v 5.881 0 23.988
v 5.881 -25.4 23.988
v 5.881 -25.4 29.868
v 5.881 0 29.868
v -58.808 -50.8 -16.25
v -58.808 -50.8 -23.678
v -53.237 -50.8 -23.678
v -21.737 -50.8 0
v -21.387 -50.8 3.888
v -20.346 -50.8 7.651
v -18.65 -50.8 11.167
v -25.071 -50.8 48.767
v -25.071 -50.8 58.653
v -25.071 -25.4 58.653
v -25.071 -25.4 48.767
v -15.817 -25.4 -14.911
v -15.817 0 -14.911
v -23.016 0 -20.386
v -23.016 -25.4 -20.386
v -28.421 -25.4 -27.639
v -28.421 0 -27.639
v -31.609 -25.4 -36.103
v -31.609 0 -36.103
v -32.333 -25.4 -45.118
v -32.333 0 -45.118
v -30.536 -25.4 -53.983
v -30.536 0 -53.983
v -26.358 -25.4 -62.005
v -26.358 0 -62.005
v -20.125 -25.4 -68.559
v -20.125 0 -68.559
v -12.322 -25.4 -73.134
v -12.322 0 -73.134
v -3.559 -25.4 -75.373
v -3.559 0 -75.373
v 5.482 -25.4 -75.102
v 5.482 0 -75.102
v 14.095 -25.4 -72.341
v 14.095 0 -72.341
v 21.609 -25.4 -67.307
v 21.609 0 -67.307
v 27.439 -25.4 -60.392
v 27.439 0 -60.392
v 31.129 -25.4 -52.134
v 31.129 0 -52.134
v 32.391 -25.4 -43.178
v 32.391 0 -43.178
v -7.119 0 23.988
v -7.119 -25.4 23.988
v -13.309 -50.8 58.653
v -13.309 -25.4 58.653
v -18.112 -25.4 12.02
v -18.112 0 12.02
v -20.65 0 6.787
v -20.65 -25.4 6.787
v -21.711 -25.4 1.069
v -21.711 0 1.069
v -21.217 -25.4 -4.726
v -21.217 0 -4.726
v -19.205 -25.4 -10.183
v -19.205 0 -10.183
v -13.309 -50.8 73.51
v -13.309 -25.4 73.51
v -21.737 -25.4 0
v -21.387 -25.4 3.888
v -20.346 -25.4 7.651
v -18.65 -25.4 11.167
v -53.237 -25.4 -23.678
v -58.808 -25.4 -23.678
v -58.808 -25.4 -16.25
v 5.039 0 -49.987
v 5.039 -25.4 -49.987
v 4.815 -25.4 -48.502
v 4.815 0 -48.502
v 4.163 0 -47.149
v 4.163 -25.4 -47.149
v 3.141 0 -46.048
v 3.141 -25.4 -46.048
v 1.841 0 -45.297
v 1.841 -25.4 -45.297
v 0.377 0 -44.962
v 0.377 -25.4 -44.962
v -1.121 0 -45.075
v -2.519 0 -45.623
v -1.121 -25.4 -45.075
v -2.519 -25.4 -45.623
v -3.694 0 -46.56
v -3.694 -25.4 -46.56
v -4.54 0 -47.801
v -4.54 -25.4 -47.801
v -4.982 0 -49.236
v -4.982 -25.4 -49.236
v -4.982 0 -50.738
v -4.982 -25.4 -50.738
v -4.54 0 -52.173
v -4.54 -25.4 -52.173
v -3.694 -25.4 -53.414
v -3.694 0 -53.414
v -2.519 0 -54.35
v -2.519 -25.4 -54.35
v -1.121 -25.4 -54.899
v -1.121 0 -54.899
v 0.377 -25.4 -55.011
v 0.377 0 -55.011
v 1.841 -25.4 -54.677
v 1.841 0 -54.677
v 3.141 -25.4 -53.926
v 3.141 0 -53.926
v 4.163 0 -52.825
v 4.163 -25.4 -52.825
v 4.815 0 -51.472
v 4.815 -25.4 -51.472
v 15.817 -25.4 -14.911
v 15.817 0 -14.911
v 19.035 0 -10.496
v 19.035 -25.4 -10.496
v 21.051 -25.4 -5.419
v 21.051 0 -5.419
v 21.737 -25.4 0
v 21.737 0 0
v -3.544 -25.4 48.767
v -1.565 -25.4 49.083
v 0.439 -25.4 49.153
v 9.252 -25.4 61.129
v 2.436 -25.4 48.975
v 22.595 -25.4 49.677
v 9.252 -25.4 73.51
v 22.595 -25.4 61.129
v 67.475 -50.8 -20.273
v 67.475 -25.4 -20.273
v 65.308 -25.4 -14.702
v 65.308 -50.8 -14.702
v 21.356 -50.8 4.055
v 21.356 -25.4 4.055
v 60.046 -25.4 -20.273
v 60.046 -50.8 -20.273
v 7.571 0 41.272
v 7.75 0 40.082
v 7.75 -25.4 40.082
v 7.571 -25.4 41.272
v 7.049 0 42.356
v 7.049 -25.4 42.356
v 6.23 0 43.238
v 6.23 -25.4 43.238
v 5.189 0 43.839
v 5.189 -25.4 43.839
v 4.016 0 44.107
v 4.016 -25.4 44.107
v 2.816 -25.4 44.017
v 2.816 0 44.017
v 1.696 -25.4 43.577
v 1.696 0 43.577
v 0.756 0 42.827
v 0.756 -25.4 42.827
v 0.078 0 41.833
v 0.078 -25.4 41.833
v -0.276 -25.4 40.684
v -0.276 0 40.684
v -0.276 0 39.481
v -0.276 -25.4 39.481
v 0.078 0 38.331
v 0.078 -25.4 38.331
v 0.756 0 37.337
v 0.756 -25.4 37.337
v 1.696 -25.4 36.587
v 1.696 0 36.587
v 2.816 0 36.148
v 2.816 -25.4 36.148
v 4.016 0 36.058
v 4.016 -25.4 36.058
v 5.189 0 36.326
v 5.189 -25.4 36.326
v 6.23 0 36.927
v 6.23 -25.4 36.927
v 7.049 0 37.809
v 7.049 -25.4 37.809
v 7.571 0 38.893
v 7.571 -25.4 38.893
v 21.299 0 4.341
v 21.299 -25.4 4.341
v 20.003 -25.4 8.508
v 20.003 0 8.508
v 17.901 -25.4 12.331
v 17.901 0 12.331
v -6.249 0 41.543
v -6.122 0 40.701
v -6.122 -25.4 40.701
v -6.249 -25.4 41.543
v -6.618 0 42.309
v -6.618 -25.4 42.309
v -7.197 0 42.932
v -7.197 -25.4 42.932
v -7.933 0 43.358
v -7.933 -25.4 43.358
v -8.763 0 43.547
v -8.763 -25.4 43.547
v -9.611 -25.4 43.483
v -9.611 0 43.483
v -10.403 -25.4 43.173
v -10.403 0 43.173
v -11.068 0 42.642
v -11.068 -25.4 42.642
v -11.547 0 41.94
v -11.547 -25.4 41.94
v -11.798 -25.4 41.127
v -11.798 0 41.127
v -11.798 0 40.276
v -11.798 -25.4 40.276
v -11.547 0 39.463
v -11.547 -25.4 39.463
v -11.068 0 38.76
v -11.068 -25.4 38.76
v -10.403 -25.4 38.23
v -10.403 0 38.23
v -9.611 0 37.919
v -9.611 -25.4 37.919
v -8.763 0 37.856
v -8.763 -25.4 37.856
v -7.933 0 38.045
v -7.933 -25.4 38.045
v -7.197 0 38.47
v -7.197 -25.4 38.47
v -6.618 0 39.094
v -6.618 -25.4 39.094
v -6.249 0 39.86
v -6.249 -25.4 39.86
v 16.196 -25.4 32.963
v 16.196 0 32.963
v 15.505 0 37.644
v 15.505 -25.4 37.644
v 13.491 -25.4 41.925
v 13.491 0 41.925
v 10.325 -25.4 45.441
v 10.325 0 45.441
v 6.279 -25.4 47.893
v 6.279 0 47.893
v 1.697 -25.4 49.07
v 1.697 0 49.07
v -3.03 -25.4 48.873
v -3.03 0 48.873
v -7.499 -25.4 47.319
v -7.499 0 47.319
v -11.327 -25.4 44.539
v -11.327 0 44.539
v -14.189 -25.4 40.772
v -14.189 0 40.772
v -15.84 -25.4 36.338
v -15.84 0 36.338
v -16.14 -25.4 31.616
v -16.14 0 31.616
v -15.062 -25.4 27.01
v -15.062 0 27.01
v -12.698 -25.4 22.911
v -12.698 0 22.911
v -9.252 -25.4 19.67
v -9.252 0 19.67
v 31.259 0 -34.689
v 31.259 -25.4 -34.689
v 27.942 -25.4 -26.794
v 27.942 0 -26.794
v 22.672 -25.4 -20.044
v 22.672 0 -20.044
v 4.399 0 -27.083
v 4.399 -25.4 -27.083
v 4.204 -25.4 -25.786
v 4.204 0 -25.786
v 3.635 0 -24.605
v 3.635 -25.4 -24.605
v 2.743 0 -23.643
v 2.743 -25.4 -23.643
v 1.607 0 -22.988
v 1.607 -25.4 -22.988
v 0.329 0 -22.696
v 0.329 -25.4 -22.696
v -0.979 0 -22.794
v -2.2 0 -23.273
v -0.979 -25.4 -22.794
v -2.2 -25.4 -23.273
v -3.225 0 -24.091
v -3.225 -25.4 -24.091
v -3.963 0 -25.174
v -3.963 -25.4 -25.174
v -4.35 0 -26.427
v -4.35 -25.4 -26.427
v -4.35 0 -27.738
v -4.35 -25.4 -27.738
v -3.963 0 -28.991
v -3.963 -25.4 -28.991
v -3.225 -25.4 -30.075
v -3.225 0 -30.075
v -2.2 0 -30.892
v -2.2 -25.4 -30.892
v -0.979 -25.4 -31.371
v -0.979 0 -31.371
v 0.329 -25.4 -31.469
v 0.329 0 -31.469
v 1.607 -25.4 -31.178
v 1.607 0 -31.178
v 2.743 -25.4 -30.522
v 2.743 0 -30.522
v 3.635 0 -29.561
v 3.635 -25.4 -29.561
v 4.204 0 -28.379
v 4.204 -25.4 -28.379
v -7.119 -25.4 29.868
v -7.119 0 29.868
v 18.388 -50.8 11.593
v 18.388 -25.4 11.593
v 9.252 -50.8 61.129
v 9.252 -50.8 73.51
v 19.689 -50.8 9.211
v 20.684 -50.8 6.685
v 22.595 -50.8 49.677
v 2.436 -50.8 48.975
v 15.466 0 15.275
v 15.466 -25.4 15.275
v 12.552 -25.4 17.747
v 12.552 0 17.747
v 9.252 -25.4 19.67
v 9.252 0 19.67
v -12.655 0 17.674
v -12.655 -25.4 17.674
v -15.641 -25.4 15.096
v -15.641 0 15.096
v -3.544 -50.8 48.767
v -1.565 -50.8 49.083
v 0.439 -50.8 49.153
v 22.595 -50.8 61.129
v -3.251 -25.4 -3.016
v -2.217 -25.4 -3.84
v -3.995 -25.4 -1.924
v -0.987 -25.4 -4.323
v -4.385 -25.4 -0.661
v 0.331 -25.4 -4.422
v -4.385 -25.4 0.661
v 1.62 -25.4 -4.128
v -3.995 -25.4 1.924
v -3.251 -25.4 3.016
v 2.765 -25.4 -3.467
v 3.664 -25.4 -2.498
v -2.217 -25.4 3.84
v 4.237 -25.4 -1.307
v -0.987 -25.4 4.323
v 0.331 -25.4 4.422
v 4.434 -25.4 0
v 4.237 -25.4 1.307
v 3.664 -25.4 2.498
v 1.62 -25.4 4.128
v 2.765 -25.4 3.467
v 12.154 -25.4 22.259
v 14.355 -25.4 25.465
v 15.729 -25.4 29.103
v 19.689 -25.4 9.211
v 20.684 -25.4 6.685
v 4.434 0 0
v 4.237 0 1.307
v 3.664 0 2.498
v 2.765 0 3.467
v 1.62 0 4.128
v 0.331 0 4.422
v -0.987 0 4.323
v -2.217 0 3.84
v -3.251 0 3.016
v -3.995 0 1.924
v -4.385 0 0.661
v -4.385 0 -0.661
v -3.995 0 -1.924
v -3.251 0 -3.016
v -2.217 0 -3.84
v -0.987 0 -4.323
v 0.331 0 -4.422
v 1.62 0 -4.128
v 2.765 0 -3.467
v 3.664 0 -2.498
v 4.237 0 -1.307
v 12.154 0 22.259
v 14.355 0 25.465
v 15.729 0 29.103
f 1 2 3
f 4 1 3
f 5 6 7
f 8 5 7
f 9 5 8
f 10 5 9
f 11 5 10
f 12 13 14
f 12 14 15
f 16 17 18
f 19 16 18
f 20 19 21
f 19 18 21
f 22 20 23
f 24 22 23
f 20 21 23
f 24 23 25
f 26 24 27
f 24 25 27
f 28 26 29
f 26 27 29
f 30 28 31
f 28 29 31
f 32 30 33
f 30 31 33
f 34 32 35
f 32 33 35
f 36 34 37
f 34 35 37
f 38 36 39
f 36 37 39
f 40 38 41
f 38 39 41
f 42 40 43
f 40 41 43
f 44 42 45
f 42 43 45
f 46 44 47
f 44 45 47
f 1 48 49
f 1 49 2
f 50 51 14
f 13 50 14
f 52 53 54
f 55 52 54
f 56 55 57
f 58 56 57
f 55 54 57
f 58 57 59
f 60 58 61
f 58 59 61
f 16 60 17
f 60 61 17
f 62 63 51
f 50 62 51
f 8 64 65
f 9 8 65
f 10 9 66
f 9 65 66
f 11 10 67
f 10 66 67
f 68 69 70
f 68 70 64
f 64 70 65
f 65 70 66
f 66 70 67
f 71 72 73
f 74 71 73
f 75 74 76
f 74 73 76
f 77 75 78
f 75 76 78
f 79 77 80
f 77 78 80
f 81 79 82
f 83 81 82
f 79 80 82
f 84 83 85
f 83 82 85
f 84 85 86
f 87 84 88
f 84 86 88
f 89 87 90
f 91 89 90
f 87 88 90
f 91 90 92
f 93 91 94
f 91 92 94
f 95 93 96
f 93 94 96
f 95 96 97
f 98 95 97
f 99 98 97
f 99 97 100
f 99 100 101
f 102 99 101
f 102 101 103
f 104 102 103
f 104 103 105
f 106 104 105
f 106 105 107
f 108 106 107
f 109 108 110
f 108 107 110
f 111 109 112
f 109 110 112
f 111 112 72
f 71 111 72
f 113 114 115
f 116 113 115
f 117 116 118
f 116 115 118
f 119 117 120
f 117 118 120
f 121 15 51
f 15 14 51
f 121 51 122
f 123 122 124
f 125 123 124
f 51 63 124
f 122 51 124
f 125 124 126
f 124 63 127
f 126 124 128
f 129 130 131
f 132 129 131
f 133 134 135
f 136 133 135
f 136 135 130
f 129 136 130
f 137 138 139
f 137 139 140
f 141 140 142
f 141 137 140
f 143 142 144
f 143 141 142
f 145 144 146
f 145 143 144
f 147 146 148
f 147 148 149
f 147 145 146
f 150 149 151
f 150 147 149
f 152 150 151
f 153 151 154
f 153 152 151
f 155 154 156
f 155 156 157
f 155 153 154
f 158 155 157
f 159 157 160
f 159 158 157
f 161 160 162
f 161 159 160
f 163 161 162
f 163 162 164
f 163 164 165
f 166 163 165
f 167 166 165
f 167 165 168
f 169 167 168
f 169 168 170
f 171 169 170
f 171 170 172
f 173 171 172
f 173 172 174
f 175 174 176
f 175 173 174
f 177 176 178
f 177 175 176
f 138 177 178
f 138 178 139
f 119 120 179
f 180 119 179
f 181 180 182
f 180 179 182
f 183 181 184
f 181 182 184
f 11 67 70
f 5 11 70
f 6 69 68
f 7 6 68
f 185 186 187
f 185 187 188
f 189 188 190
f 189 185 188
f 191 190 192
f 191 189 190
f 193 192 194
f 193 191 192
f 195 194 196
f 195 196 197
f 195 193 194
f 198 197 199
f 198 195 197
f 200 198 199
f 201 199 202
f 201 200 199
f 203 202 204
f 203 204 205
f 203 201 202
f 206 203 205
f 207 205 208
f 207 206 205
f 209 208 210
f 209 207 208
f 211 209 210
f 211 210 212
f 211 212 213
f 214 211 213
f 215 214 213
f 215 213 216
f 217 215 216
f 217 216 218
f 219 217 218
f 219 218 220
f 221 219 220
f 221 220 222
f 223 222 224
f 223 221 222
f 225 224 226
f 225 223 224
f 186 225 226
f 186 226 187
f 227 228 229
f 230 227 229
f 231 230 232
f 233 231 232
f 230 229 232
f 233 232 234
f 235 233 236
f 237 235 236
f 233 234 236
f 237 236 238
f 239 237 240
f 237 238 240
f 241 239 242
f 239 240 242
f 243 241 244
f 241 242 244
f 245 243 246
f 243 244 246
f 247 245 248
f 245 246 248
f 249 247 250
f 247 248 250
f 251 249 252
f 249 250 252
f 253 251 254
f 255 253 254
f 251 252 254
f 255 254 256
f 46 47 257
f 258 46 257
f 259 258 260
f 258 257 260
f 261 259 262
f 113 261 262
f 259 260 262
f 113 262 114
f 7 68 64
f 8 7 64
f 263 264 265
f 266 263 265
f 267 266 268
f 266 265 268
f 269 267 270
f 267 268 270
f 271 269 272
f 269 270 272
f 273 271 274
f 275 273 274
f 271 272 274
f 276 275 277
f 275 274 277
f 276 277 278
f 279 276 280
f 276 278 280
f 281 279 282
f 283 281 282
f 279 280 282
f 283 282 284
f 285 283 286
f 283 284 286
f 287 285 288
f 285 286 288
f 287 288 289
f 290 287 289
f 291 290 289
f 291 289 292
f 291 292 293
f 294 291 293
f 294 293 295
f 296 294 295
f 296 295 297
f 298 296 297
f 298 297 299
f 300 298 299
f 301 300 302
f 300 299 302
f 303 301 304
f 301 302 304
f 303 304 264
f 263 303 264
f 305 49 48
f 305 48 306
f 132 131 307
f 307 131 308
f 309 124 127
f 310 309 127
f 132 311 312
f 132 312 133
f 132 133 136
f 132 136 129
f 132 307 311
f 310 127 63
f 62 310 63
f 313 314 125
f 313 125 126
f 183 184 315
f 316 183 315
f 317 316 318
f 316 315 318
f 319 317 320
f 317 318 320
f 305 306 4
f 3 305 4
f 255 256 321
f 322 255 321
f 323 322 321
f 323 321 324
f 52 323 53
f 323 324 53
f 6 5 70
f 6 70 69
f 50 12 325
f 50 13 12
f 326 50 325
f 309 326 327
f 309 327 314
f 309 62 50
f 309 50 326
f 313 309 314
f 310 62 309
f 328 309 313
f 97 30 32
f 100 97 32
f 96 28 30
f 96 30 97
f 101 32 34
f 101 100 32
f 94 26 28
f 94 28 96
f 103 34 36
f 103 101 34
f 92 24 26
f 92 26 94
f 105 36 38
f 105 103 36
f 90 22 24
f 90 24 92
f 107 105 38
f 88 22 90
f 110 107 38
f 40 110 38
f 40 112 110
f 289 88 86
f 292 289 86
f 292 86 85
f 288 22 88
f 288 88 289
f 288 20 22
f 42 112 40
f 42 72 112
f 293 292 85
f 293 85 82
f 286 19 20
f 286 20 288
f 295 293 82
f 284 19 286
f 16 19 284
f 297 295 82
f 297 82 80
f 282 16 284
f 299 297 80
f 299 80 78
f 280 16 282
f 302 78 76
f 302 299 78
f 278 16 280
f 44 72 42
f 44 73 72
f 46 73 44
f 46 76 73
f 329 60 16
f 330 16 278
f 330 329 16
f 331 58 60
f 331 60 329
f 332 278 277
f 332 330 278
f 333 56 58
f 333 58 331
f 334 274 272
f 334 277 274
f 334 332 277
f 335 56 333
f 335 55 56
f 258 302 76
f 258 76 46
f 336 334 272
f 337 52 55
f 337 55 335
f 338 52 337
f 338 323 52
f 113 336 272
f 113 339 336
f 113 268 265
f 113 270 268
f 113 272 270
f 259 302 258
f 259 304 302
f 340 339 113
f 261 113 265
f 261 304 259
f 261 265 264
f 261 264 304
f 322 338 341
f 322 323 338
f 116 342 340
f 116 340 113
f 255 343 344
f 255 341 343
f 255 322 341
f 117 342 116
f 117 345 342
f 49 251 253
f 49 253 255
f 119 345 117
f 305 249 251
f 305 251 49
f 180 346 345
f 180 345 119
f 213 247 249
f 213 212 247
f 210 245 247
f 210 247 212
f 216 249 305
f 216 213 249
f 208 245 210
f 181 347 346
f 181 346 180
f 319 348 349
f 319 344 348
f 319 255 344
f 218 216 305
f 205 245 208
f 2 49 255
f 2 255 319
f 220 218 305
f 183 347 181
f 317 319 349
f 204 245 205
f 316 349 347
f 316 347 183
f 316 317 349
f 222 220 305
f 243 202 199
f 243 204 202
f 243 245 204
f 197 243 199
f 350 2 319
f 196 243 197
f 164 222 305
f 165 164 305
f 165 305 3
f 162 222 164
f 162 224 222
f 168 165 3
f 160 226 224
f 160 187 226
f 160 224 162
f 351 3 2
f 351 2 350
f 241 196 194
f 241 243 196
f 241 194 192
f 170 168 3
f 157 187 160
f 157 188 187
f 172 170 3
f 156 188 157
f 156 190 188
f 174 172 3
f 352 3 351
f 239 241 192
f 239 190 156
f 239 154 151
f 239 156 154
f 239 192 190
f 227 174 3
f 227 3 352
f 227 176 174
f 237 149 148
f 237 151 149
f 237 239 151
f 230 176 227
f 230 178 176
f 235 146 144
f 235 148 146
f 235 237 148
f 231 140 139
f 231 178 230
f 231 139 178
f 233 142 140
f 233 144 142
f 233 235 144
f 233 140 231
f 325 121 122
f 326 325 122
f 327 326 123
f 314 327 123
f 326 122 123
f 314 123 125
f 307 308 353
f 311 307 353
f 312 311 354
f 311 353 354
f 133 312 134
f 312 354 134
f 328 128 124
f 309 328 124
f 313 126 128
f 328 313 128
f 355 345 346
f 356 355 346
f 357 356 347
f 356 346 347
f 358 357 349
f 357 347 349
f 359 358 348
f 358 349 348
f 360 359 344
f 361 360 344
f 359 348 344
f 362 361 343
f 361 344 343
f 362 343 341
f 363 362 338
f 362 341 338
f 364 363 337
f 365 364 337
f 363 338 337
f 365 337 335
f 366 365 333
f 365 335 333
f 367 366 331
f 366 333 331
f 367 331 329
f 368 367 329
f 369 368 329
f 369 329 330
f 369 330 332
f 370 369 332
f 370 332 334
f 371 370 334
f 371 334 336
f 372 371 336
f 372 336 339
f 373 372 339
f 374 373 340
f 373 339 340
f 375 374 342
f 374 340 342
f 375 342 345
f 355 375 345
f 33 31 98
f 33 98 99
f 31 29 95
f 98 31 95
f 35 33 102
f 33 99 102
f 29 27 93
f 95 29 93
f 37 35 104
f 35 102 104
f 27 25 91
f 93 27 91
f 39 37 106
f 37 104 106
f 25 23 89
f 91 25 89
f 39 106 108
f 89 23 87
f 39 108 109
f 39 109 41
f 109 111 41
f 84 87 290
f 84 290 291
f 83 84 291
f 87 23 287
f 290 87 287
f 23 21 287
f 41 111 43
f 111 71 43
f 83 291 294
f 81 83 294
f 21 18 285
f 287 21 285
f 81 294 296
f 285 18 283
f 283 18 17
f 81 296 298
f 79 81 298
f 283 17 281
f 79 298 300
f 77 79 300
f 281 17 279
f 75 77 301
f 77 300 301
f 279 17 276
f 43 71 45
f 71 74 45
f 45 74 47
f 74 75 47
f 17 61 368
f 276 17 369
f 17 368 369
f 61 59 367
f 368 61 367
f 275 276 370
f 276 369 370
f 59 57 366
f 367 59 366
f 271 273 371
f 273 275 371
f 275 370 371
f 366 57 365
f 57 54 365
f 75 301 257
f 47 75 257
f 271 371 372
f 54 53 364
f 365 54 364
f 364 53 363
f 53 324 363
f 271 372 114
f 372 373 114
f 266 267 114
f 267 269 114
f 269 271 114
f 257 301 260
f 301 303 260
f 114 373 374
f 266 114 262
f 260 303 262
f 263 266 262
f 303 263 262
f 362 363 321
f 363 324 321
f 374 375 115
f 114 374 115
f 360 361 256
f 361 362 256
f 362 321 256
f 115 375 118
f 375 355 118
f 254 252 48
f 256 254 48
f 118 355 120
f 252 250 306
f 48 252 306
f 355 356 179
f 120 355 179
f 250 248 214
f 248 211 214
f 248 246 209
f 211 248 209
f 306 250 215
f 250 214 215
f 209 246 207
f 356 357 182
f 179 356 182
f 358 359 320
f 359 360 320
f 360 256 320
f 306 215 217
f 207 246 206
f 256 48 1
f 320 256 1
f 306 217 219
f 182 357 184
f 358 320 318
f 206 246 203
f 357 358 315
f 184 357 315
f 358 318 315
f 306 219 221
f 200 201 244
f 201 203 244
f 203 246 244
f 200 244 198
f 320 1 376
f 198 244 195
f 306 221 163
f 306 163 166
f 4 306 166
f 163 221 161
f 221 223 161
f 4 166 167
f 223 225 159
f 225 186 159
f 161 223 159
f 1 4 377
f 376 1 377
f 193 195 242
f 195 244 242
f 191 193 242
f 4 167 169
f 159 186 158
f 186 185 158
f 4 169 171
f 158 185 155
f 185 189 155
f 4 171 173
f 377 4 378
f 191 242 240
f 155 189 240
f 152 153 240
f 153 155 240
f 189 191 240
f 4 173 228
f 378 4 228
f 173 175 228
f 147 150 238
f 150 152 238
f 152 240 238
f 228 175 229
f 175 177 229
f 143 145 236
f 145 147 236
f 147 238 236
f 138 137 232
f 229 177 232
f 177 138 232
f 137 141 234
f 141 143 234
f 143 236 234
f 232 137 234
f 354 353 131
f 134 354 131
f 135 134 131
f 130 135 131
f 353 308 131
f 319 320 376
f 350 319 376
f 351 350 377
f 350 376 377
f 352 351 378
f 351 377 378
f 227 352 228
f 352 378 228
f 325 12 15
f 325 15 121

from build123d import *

# Parameters (mm, degrees)
F0_R      = 2.8536008332
F0_R_2    = 4.0356012678
F1_DEPTH  = 25.4
F2_W      = 12.9996906035
F2_H      = 5.8808140457
F3_DEPTH  = 25.4
F4_R      = 4.4343033165
F4_R_2    = 4.3990558924
F4_R_3    = 5.038563347
F5_DEPTH  = 25.4
F7_DEPTH  = 25.4
F9_DEPTH  = 25.4
F11_DEPTH = 25.4


with BuildPart() as f1:
    # F0 (on Front) → F1 (new body)
    with BuildSketch(Plane.XZ):
        with BuildLine():
            ThreePointArc((15.8172677796, -14.9105895849), (20.2031786749, -8.021422144), (21.7373329041, 0))
            ThreePointArc((21.7373329041, 0), (20.7561218785, 6.4571701502), (17.9010714334, 12.3313942164))
            ThreePointArc((17.9010714334, 12.3313942164), (14.0634805526, 16.5749858682), (9.2515846168, 19.6702776763))
            ThreePointArc((9.2515846168, 19.6702776763), (0, 16.767772755), (-9.2515846168, 19.6702776763))
            ThreePointArc((-9.2515846168, 19.6702776763), (-14.2062358877, 16.4527962269), (-18.1115831207, 12.0200748186))
            ThreePointArc((-18.1115831207, 12.0200748186), (-21.6588758286, -1.845193655), (-15.8172677796, -14.9105895849))
            ThreePointArc((-15.8172677796, -14.9105895849), (0, -10.7860838011), (15.8172677796, -14.9105895849))
        make_face()
        with BuildLine():
            ThreePointArc((32.3914575442, -43.1775413454), (27.9423592382, -26.7936748284), (15.8172677796, -14.9105895849))
            ThreePointArc((15.8172677796, -14.9105895849), (0, -21.7373329041), (-15.8172677796, -14.9105895849))
            ThreePointArc((-15.8172677796, -14.9105895849), (-16.3838665169, -71.1199005835), (32.3914575442, -43.1775413454))
        make_face()
        with BuildLine():
            ThreePointArc((-15.8172677796, -14.9105895849), (0, -21.7373329041), (15.8172677796, -14.9105895849))
            ThreePointArc((15.8172677796, -14.9105895849), (0, -10.7860838011), (-15.8172677796, -14.9105895849))
        make_face()
        with BuildLine():
            ThreePointArc((-9.2515846168, 19.6702776763), (0, 16.767772755), (9.2515846168, 19.6702776763))
            ThreePointArc((9.2515846168, 19.6702776763), (0, 21.7373329041), (-9.2515846168, 19.6702776763))
        make_face()
        with BuildLine():
            ThreePointArc((-9.2515846168, 19.6702776763), (0, 21.7373329041), (9.2515846168, 19.6702776763))
            ThreePointArc((9.2515846168, 19.6702776763), (14.3550983655, 25.4646519589), (16.1957266719, 32.9634994268))
            ThreePointArc((16.1957266719, 32.9634994268), (-7.498847468, 47.3185977923), (-9.2515846168, 19.6702776763))
        make_face()
        with Locations((-8.9759770781, 40.7014116645)):
            Circle(F0_R, mode=Mode.SUBTRACT)
        with Locations((3.7141984794, 40.0823801756)):
            Circle(F0_R_2, mode=Mode.SUBTRACT)
    extrude(amount=F1_DEPTH)

    # F2 (on face) → F3 (cut)
    with BuildSketch(Plane.XZ.offset(25.4)):
        with Locations((-0.6190321874, 26.9279312342)):
            Rectangle(F2_W, F2_H)
    extrude(amount=-F3_DEPTH, mode=Mode.SUBTRACT)

    # F4 (on face) → F5 (cut)
    with BuildSketch(Plane.XZ.offset(25.4)):
        Circle(F4_R)
        with Locations((0, -27.0826891065)):
            Circle(F4_R_2)
        with Locations((0, -49.9869063497)):
            Circle(F4_R_3)
    extrude(amount=-F5_DEPTH, mode=Mode.SUBTRACT)


with BuildPart() as f7:
    # F6 (on face) → F7 (new body)
    with BuildSketch(Plane.XZ.offset(25.4)):
        with BuildLine():
            Line((-25.0708362817, 48.766700526), (-3.5440651025, 48.766700526))
            ThreePointArc((-3.5440651025, 48.766700526), (-0.5639242648, 49.1494053902), (2.4356253039, 48.975035637))
            Line((2.4356253039, 48.975035637), (22.5946996361, 49.6773868799))
            Line((22.5946996361, 49.6773868799), (22.5946996361, 61.1294955015))
            Line((22.5946996361, 61.1294955015), (9.2515846168, 61.1294955015))
            Line((9.2515846168, 61.1294955015), (9.2515846168, 73.5101550817))
            Line((9.2515846168, 73.5101550817), (-13.3092068136, 73.5101550817))
            Line((-13.3092068136, 73.5101550817), (-13.3092068136, 58.6533658206))
            Line((-13.3092068136, 58.6533658206), (-25.0708362817, 58.6533658206))
            Line((-25.0708362817, 58.6533658206), (-25.0708362817, 48.766700526))
        make_face()
    extrude(amount=F7_DEPTH)


with BuildPart() as f9:
    # F8 (on face) → F9 (new body)
    with BuildSketch(Plane.XZ.offset(25.4)):
        with BuildLine():
            Line((65.3079748154, -14.7020313889), (18.3878017668, 11.5931181297))
            ThreePointArc((18.3878017668, 11.5931181297), (20.2261142875, 7.9634127491), (21.3558173633, 4.0547141121))
            Line((21.3558173633, 4.0547141121), (60.0461885333, -20.2733278275))
            Line((60.0461885333, -20.2733278275), (67.4745887518, -20.2733278275))
            Line((67.4745887518, -20.2733278275), (65.3079748154, -14.7020313889))
        make_face()
    extrude(amount=F9_DEPTH)


with BuildPart() as f11:
    # F10 (on face) → F11 (new body)
    with BuildSketch(Plane.XZ.offset(25.4)):
        with BuildLine():
            ThreePointArc((-21.7373329041, 0), (-20.9512654201, 5.7927643728), (-18.6499146613, 11.1665717617))
            Line((-18.6499146613, 11.1665717617), (-58.8081255555, -16.2496138364))
            Line((-58.8081255555, -16.2496138364), (-58.8081255555, -23.678008467))
            Line((-58.8081255555, -23.678008467), (-53.2368272543, -23.678008467))
            Line((-53.2368272543, -23.678008467), (-21.7373329041, 0))
        make_face()
    extrude(amount=F11_DEPTH)


solid = Compound([f1.part, f7.part, f9.part, f11.part])
